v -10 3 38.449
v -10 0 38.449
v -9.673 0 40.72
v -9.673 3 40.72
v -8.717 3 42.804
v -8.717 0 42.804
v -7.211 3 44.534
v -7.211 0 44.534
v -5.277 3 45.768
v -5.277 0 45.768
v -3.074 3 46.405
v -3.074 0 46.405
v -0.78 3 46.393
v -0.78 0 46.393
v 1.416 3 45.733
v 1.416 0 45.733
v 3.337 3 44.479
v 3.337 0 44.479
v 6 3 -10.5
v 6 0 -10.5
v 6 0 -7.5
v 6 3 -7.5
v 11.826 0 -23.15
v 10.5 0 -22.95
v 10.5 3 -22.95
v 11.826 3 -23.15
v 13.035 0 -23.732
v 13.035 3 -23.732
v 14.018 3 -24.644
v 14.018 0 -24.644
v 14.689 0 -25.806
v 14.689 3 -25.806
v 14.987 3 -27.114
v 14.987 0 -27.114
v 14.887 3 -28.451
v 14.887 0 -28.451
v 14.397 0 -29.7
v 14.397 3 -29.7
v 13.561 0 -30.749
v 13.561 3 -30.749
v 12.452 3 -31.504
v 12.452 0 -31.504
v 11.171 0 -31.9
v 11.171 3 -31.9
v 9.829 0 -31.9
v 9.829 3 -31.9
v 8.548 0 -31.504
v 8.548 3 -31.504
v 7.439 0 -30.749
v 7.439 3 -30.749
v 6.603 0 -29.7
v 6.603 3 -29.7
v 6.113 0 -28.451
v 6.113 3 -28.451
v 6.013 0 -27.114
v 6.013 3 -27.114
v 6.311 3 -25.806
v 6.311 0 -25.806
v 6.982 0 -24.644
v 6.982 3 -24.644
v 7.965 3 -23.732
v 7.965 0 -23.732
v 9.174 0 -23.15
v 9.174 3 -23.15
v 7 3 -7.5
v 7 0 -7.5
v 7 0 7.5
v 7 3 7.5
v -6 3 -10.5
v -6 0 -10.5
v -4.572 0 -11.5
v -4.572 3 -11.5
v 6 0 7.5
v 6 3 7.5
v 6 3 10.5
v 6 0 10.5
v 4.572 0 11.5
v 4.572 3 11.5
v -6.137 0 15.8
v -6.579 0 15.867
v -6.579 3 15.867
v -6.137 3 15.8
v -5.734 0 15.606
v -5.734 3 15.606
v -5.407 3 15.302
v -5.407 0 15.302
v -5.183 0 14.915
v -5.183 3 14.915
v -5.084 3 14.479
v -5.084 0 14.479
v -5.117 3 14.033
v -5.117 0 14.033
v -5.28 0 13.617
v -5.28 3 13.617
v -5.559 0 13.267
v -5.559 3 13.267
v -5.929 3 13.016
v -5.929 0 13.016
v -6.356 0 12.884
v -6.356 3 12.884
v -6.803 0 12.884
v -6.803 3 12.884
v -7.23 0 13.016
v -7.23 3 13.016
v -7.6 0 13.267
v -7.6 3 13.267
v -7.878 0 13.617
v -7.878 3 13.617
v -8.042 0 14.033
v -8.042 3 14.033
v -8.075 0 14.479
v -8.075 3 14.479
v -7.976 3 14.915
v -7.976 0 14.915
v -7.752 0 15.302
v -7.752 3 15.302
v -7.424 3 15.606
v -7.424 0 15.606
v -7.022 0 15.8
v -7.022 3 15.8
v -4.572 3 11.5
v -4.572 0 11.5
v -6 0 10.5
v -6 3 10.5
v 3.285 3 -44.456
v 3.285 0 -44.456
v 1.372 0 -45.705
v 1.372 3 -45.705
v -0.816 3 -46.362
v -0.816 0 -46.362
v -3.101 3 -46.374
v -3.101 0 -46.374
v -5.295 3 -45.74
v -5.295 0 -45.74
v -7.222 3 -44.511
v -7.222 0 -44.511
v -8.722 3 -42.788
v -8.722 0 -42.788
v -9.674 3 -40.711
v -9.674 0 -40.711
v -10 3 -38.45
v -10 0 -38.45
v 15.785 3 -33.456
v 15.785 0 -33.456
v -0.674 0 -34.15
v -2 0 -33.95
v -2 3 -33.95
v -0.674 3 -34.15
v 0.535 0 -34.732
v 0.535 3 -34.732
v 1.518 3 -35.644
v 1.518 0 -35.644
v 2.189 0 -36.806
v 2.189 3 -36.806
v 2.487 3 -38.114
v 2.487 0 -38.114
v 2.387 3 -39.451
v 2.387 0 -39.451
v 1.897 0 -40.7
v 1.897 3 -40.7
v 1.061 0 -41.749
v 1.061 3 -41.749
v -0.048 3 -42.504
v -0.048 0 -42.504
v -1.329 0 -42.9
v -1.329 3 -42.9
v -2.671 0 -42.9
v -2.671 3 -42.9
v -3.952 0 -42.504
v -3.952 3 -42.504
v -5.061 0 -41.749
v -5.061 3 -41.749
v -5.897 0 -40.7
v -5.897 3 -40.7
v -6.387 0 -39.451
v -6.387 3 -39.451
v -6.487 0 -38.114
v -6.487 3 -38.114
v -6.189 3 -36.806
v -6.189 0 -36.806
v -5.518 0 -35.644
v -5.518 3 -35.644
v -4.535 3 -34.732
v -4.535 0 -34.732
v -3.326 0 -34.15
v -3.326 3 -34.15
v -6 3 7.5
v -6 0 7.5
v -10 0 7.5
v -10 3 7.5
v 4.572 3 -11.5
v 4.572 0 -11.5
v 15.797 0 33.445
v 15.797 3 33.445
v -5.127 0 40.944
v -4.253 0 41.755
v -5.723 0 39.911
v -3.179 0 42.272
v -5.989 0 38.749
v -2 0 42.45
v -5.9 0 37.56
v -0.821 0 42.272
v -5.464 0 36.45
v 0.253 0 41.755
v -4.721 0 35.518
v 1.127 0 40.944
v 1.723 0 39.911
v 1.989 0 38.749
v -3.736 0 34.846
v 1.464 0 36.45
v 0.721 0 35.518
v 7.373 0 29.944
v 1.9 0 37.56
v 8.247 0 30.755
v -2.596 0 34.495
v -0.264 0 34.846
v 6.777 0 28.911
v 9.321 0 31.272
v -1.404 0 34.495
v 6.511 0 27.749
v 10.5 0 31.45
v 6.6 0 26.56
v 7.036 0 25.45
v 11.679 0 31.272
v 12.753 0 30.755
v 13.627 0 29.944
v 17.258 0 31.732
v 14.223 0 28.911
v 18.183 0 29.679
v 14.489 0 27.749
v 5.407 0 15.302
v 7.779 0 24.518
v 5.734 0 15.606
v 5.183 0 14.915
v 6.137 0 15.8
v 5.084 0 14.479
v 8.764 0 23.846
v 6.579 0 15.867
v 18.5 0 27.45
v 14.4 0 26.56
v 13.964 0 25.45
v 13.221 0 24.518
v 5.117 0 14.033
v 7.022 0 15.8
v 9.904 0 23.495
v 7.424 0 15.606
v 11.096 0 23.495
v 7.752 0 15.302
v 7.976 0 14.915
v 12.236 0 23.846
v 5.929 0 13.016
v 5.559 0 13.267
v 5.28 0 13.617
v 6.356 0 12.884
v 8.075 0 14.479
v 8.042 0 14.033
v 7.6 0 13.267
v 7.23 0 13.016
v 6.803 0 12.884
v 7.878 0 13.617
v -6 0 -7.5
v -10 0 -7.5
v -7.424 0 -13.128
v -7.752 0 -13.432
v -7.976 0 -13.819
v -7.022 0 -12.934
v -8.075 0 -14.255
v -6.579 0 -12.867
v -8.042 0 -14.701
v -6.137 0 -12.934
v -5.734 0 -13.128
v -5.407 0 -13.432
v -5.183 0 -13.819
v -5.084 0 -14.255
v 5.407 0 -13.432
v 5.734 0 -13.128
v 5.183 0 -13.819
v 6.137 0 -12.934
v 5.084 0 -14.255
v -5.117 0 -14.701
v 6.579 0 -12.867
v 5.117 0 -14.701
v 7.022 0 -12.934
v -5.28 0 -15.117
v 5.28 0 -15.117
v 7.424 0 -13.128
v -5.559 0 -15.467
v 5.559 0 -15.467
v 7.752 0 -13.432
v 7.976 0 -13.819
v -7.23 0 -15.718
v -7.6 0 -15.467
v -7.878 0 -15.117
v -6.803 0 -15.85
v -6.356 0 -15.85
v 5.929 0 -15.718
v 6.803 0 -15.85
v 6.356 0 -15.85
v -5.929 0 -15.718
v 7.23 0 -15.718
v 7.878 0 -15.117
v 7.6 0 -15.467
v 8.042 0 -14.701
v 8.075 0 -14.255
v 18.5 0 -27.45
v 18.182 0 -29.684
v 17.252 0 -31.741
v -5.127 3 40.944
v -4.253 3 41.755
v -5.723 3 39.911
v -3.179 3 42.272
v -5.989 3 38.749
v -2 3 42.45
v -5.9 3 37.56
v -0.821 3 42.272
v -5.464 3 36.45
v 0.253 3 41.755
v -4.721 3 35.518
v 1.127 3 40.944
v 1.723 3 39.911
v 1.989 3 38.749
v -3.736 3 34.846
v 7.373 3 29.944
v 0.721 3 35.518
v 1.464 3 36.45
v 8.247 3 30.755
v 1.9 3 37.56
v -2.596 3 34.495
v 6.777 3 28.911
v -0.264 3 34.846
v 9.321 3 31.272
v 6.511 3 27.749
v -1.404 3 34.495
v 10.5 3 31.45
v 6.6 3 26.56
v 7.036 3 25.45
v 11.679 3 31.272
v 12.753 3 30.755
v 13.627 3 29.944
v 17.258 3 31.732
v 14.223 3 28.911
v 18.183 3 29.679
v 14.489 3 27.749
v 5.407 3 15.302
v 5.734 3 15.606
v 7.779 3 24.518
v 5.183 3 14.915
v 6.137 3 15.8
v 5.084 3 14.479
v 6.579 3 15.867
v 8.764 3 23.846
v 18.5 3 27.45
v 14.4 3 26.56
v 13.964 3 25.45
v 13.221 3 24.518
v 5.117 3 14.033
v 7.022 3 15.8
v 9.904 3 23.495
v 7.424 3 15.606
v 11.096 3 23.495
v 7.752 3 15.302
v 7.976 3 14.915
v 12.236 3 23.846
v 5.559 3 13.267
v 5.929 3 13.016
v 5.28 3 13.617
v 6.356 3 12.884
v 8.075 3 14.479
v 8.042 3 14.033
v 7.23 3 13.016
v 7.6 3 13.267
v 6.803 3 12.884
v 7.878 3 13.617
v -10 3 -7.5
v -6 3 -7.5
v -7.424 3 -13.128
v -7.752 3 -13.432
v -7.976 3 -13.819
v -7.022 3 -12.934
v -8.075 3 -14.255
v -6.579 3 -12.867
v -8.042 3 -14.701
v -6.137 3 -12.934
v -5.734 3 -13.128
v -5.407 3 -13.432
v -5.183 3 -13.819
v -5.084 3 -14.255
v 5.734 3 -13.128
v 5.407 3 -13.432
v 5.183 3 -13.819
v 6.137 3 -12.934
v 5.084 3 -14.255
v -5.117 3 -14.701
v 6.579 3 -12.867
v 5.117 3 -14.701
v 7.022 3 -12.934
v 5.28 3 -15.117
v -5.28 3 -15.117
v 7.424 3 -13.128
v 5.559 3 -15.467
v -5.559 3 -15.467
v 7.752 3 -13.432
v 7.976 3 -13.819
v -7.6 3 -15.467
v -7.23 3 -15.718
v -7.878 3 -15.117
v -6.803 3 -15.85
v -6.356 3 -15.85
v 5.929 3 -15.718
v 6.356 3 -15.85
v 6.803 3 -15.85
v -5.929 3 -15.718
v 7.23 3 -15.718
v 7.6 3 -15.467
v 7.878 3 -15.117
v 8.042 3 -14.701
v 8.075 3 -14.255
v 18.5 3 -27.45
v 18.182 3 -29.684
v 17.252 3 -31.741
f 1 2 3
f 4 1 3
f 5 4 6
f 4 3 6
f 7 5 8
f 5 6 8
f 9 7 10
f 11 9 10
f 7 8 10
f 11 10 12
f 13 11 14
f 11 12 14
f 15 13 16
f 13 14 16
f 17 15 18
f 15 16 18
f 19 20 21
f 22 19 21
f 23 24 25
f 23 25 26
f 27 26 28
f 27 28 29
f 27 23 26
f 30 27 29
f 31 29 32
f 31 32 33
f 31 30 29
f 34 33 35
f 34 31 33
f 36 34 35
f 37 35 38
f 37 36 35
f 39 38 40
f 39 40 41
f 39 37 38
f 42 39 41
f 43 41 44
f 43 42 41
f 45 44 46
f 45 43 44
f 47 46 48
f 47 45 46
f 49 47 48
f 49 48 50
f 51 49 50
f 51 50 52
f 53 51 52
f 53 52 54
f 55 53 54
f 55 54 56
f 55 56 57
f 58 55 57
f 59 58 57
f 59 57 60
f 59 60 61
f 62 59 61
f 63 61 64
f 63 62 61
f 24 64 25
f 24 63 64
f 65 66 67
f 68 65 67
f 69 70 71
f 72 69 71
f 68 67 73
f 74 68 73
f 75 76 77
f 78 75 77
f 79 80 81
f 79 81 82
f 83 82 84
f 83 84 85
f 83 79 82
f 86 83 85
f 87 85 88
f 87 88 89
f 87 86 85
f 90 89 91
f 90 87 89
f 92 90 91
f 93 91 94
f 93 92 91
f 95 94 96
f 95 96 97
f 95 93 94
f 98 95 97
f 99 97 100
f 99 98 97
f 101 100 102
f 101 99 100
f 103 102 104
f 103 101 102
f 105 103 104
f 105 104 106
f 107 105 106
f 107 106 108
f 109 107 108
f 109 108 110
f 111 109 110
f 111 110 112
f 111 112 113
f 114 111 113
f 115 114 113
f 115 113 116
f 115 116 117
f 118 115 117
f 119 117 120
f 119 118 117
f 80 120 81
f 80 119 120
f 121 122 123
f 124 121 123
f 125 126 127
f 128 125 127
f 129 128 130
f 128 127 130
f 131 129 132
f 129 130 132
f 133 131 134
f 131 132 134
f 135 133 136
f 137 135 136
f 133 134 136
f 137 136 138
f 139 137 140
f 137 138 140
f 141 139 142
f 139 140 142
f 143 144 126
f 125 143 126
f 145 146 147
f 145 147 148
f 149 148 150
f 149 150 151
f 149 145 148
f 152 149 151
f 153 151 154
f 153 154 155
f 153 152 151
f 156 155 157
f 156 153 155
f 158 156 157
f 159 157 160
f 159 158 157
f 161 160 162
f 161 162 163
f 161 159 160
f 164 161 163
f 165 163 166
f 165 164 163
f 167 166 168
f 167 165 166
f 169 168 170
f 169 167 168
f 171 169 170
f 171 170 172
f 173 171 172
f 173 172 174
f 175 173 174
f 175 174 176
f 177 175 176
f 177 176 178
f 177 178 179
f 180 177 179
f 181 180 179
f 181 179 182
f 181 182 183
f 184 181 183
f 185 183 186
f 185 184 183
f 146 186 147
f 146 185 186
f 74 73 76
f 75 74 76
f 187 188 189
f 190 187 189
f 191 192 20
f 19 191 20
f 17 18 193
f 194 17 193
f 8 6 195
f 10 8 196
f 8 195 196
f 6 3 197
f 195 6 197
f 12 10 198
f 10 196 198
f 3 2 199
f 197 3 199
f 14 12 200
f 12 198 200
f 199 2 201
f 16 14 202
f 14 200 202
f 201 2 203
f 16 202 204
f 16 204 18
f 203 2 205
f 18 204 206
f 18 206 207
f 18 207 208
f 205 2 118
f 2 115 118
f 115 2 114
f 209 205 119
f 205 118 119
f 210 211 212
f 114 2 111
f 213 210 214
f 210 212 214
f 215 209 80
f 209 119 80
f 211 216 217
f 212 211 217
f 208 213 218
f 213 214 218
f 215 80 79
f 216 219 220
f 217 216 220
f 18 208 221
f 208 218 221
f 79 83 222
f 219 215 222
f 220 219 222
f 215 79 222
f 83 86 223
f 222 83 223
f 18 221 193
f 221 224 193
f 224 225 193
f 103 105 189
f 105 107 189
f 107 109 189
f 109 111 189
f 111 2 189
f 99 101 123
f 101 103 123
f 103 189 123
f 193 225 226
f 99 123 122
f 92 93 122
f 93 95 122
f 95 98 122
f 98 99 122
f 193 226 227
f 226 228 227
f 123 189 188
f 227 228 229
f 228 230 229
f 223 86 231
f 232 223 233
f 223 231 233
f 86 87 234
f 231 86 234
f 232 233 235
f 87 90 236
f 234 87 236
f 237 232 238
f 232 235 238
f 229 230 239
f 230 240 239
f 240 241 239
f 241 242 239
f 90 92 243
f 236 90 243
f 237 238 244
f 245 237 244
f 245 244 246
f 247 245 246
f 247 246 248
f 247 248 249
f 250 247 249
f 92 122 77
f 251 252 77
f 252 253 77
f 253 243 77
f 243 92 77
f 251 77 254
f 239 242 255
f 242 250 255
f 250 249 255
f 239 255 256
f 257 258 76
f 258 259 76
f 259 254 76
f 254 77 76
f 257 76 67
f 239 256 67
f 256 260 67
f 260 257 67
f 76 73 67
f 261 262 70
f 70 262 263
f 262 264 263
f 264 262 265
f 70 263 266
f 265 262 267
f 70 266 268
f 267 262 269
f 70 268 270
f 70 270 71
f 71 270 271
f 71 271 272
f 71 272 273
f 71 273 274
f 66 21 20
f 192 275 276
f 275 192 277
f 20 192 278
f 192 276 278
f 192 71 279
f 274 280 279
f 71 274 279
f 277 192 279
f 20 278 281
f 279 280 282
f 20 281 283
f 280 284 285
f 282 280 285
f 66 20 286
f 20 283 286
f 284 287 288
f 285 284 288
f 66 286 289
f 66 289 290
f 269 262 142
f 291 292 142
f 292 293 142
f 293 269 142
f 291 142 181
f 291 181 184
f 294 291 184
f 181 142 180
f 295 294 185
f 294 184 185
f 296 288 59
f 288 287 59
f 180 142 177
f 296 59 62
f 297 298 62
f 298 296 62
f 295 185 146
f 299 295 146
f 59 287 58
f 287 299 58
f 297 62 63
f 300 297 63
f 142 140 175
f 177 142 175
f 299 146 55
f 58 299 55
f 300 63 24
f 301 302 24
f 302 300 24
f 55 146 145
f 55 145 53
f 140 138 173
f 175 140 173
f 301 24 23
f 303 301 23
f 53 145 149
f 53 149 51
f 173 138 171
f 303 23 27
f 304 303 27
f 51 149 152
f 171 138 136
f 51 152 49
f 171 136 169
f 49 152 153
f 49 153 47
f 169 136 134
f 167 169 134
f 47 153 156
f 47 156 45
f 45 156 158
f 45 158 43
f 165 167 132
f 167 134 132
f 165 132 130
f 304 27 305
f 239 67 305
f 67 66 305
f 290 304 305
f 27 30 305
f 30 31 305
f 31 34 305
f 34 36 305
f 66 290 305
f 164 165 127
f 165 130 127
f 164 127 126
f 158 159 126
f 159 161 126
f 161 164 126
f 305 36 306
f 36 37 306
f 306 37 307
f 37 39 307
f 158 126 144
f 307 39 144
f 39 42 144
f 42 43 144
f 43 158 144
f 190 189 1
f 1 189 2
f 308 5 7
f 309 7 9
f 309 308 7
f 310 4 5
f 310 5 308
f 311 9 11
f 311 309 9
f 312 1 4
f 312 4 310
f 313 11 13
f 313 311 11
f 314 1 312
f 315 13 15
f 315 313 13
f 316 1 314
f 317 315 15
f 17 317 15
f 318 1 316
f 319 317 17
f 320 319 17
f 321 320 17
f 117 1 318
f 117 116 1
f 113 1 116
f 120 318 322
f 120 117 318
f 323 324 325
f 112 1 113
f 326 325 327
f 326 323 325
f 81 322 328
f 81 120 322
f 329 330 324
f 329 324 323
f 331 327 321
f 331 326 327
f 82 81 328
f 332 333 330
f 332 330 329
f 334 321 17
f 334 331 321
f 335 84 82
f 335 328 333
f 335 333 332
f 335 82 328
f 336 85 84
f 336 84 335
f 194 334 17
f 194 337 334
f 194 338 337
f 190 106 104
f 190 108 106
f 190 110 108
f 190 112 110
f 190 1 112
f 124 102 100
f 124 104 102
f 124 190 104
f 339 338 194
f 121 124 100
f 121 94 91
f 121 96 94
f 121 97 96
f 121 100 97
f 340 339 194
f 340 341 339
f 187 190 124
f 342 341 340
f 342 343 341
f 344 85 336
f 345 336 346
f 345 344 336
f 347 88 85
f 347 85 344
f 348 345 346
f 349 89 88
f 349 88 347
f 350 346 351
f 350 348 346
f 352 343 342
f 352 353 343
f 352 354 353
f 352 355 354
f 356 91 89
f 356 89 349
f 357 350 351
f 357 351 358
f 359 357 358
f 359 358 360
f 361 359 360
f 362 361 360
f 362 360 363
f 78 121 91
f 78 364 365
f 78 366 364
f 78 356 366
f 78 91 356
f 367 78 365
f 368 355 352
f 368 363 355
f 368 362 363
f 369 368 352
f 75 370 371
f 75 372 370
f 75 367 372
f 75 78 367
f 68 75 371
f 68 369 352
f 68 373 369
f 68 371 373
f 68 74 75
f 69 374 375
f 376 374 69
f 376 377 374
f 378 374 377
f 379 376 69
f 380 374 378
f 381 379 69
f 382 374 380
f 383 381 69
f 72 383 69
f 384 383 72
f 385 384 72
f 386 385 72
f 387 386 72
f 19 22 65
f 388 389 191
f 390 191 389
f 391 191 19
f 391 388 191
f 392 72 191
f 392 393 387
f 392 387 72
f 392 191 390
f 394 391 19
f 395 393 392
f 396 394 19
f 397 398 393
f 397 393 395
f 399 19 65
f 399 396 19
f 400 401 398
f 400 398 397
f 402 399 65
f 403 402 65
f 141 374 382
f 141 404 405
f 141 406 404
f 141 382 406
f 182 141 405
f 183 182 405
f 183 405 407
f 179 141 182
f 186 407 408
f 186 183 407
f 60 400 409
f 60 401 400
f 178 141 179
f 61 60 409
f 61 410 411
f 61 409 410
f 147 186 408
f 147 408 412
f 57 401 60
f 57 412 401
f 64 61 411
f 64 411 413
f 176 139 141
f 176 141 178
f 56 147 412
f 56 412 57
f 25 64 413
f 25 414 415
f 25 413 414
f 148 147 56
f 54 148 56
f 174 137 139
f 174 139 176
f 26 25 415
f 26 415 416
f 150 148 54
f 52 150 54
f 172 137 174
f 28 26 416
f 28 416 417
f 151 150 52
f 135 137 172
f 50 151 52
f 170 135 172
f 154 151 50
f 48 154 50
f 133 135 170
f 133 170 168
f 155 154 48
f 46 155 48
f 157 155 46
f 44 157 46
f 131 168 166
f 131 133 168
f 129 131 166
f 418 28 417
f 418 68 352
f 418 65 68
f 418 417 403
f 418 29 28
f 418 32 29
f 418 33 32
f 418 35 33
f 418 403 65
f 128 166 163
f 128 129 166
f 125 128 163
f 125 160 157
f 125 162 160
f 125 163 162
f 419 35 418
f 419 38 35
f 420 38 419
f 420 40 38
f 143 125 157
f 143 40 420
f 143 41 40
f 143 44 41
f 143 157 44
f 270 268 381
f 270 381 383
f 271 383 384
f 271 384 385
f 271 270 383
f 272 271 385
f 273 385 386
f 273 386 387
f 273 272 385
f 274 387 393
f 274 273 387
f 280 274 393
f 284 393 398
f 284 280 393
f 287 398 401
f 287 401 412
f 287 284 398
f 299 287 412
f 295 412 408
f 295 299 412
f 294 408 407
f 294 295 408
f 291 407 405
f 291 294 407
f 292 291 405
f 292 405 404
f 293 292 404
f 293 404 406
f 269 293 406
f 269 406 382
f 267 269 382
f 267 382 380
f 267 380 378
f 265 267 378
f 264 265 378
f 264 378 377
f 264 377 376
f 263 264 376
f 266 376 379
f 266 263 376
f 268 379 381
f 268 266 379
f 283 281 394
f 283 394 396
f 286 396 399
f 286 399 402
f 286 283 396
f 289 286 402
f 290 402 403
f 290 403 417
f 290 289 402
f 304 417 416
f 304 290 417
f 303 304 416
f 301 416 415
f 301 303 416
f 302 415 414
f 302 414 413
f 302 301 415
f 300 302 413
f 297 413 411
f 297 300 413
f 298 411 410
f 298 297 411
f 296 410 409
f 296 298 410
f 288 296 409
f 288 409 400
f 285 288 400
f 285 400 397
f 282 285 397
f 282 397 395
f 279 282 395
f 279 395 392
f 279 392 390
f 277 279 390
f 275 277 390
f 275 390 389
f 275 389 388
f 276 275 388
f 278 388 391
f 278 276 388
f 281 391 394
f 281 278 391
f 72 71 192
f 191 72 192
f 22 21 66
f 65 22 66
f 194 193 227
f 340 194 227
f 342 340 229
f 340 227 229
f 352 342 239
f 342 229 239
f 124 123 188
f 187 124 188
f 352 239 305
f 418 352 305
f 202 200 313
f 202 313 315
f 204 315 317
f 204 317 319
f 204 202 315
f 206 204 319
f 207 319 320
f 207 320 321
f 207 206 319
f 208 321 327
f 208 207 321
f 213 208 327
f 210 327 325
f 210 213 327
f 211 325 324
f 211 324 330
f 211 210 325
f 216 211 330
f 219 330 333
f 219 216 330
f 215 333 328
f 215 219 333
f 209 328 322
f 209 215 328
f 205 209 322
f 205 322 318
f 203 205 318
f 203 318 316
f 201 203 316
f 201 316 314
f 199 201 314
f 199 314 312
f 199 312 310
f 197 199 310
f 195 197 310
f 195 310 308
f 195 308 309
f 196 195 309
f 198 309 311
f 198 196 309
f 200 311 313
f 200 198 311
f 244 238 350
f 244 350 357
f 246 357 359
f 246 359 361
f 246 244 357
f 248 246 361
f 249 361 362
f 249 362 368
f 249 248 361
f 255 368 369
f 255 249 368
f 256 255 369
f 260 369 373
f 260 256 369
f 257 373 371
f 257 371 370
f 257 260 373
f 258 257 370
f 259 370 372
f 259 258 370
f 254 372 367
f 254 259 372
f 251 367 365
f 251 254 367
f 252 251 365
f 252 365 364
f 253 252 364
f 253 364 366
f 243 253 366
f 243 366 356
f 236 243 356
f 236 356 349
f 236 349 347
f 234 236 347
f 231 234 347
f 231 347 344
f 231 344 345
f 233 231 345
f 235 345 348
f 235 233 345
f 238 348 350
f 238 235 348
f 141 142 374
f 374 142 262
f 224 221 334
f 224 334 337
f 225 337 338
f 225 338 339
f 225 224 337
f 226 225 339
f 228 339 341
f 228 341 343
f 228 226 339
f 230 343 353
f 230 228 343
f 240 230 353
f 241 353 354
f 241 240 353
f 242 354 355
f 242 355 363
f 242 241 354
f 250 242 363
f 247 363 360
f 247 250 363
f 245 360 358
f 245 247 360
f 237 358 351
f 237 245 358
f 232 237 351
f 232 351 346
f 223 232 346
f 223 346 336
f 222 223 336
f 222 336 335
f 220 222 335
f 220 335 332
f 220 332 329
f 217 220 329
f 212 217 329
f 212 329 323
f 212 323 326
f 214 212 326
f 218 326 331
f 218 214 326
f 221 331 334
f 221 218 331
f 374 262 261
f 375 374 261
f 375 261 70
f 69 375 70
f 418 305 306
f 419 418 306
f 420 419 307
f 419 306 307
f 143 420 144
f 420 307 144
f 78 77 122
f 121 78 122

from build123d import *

# Parameters (mm, degrees)
SKETCH1_R           = 4.5
SKETCH1_R_2         = 1.5
BOSS_EXTRUDE1_DEPTH = 3
BOSS_EXTRUDE2_START = -3
SKETCH3_R           = 4.5
SKETCH3_R_2         = 4
BOSS_EXTRUDE2_DEPTH = 3


with BuildPart() as part:
    # Sketch1 → Boss-Extrude1 (new body)
    with BuildSketch(Plane(origin=(0, 0, 0), x_dir=(1, 0, 0), z_dir=(0, 1, 0))):
        with BuildLine():
            Line((-6, -7.5), (-10, -7.5))
            Line((-10, -7.5), (-10, -8.75))
            Line((-10, -8.75), (-10, -38.449422848))
            ThreePointArc((-10, -38.449422848), (-5.277416427, -45.767940555), (3.336657191, -44.479052382))
            Line((3.336657191, -44.479052382), (15.796770322, -33.445350211))
            ThreePointArc((15.796770322, -33.445350211), (17.792942369, -30.73831136), (18.5, -27.450024315))
            Line((18.5, -27.450024315), (18.5, 27.45))
            ThreePointArc((18.5, 27.45), (17.789725141, 30.745437355), (15.785023159, 33.455708135))
            Line((15.785023159, 33.455708135), (3.285023159, 44.455708135))
            ThreePointArc((3.285023159, 44.455708135), (-5.295437355, 45.739725141), (-10, 38.45))
            Line((-10, 38.45), (-10, 8.75))
            Line((-10, 8.75), (-10, 7.5))
            Line((-10, 7.5), (-6, 7.5))
            Line((-6, 7.5), (-6, 10.5))
            Line((-6, 10.5), (-4.571851993, 11.5))
            Line((-4.571851993, 11.5), (4.571851993, 11.5))
            Line((4.571851993, 11.5), (6, 10.5))
            Line((6, 10.5), (6, 7.5))
            Line((6, 7.5), (7, 7.5))
            Line((7, 7.5), (7, 0))
            Line((7, 0), (7, -7.5))
            Line((7, -7.5), (6, -7.5))
            Line((6, -7.5), (6, -10.5))
            Line((6, -10.5), (4.571851993, -11.5))
            Line((4.571851993, -11.5), (-4.571851993, -11.5))
            Line((-4.571851993, -11.5), (-6, -10.5))
            Line((-6, -10.5), (-6, -7.5))
        make_face()
        with Locations(Location((-2, -38.45, 0), (0, 0, 270))):
            Circle(SKETCH1_R, mode=Mode.SUBTRACT)
        with Locations(Location((-6.57936952, -14.367032155, 0), (0, 0, 270))):
            Circle(SKETCH1_R_2, mode=Mode.SUBTRACT)
        with Locations(Location((10.5, -27.45, 0), (0, 0, 270))):
            Circle(SKETCH1_R, mode=Mode.SUBTRACT)
        with Locations(Location((6.57936952, -14.367032155, 0), (0, 0, 270))):
            Circle(SKETCH1_R_2, mode=Mode.SUBTRACT)
        with Locations(Location((-6.57936952, 14.367032155, 0), (0, 0, 270))):
            Circle(SKETCH1_R_2, mode=Mode.SUBTRACT)
        with Locations(Location((-2, 38.45, 0), (0, 0, 270))):
            Circle(SKETCH1_R, mode=Mode.SUBTRACT)
        with Locations(Location((6.57936952, 14.367032155, 0), (0, 0, 270))):
            Circle(SKETCH1_R_2, mode=Mode.SUBTRACT)
        with Locations(Location((10.5, 27.45, 0), (0, 0, 270))):
            Circle(SKETCH1_R, mode=Mode.SUBTRACT)
    extrude(amount=BOSS_EXTRUDE1_DEPTH)

    # Sketch3 → Boss-Extrude2 (add)
    # profile 1 of 2: a face of its own
    with BuildSketch(Plane(origin=(0, 3, 0), x_dir=(1, 0, 0), z_dir=(0, 1, 0)).offset(BOSS_EXTRUDE2_START)):
        with Locations((-2, -38.45)):
            Circle(SKETCH3_R)
        with Locations(Location((-2, -38.45, 0), (0, 0, 270))):
            Circle(SKETCH3_R_2, mode=Mode.SUBTRACT)
    # profile 2 of 2: a face of its own
    with BuildSketch(Plane(origin=(0, 3, 0), x_dir=(1, 0, 0), z_dir=(0, 1, 0)).offset(BOSS_EXTRUDE2_START)):
        with Locations((10.5, -27.45)):
            Circle(SKETCH3_R)
        with Locations(Location((10.5, -27.45, 0), (0, 0, 270))):
            Circle(SKETCH3_R_2, mode=Mode.SUBTRACT)
    extrude(amount=BOSS_EXTRUDE2_DEPTH)


solid = part.part
